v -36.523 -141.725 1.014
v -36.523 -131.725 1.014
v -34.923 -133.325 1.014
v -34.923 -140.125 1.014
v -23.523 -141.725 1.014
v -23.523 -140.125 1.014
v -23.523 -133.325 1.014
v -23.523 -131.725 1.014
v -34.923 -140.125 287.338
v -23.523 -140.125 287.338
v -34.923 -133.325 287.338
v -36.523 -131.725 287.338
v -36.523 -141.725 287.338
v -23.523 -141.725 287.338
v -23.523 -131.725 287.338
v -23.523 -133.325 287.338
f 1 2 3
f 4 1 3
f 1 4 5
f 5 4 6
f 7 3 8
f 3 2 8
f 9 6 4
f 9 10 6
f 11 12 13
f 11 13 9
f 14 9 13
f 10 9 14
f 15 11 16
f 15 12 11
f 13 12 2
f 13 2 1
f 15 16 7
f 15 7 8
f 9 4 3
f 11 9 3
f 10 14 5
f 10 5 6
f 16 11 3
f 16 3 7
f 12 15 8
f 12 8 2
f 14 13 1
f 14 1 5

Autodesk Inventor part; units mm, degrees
ref_plane "YZ Plane" through (0, 0, 0) normal (1, 0, 0) x (0, 1, 0)
ref_plane "XZ Plane" through (0, 0, 0) normal (0, 1, 0) x (-1, 0, 0)
ref_plane "XY Plane" through (0, 0, 0) normal (0, 0, 1) x (1, 0, 0)
ref_plane "Work Plane1" through (23.8016, -120.6016, 287.3377) normal (0, 0, 1) x (1, 0, 0)
sketch "Sketch1" plane through (23.8016, -120.6016, 287.3377) normal (0, 0, 1) x (1, 0, 0)
  line L0 (-60.325, -11.1235) -> (-60.325, -21.1235)
  line L1 (-60.325, -21.1235) -> (-47.325, -21.1235)
  line L2 (-47.325, -21.1235) -> (-47.325, -19.5235)
  line L3 (-47.325, -19.5235) -> (-58.725, -19.5235)
  line L4 (-58.725, -19.5235) -> (-58.725, -12.7235)
  line L5 (-58.725, -12.7235) -> (-47.3247, -12.7235)
  line L6 (-47.3247, -12.7235) -> (-47.3247, -11.1235)
  line L7 (-47.3247, -11.1235) -> (-60.325, -11.1235)
  point P0 (-23.8016, 120.6016)
  dimension "d0" = 10
  dimension "d1" = 13
  dimension "d2" = 1.6
  dimension "d3" = 1.6
  dimension "d4" = 1.6
extrude "Extrusion1" add sketch "Sketch1" against normal blind 286.324
properties part number "Z-table Rail"
